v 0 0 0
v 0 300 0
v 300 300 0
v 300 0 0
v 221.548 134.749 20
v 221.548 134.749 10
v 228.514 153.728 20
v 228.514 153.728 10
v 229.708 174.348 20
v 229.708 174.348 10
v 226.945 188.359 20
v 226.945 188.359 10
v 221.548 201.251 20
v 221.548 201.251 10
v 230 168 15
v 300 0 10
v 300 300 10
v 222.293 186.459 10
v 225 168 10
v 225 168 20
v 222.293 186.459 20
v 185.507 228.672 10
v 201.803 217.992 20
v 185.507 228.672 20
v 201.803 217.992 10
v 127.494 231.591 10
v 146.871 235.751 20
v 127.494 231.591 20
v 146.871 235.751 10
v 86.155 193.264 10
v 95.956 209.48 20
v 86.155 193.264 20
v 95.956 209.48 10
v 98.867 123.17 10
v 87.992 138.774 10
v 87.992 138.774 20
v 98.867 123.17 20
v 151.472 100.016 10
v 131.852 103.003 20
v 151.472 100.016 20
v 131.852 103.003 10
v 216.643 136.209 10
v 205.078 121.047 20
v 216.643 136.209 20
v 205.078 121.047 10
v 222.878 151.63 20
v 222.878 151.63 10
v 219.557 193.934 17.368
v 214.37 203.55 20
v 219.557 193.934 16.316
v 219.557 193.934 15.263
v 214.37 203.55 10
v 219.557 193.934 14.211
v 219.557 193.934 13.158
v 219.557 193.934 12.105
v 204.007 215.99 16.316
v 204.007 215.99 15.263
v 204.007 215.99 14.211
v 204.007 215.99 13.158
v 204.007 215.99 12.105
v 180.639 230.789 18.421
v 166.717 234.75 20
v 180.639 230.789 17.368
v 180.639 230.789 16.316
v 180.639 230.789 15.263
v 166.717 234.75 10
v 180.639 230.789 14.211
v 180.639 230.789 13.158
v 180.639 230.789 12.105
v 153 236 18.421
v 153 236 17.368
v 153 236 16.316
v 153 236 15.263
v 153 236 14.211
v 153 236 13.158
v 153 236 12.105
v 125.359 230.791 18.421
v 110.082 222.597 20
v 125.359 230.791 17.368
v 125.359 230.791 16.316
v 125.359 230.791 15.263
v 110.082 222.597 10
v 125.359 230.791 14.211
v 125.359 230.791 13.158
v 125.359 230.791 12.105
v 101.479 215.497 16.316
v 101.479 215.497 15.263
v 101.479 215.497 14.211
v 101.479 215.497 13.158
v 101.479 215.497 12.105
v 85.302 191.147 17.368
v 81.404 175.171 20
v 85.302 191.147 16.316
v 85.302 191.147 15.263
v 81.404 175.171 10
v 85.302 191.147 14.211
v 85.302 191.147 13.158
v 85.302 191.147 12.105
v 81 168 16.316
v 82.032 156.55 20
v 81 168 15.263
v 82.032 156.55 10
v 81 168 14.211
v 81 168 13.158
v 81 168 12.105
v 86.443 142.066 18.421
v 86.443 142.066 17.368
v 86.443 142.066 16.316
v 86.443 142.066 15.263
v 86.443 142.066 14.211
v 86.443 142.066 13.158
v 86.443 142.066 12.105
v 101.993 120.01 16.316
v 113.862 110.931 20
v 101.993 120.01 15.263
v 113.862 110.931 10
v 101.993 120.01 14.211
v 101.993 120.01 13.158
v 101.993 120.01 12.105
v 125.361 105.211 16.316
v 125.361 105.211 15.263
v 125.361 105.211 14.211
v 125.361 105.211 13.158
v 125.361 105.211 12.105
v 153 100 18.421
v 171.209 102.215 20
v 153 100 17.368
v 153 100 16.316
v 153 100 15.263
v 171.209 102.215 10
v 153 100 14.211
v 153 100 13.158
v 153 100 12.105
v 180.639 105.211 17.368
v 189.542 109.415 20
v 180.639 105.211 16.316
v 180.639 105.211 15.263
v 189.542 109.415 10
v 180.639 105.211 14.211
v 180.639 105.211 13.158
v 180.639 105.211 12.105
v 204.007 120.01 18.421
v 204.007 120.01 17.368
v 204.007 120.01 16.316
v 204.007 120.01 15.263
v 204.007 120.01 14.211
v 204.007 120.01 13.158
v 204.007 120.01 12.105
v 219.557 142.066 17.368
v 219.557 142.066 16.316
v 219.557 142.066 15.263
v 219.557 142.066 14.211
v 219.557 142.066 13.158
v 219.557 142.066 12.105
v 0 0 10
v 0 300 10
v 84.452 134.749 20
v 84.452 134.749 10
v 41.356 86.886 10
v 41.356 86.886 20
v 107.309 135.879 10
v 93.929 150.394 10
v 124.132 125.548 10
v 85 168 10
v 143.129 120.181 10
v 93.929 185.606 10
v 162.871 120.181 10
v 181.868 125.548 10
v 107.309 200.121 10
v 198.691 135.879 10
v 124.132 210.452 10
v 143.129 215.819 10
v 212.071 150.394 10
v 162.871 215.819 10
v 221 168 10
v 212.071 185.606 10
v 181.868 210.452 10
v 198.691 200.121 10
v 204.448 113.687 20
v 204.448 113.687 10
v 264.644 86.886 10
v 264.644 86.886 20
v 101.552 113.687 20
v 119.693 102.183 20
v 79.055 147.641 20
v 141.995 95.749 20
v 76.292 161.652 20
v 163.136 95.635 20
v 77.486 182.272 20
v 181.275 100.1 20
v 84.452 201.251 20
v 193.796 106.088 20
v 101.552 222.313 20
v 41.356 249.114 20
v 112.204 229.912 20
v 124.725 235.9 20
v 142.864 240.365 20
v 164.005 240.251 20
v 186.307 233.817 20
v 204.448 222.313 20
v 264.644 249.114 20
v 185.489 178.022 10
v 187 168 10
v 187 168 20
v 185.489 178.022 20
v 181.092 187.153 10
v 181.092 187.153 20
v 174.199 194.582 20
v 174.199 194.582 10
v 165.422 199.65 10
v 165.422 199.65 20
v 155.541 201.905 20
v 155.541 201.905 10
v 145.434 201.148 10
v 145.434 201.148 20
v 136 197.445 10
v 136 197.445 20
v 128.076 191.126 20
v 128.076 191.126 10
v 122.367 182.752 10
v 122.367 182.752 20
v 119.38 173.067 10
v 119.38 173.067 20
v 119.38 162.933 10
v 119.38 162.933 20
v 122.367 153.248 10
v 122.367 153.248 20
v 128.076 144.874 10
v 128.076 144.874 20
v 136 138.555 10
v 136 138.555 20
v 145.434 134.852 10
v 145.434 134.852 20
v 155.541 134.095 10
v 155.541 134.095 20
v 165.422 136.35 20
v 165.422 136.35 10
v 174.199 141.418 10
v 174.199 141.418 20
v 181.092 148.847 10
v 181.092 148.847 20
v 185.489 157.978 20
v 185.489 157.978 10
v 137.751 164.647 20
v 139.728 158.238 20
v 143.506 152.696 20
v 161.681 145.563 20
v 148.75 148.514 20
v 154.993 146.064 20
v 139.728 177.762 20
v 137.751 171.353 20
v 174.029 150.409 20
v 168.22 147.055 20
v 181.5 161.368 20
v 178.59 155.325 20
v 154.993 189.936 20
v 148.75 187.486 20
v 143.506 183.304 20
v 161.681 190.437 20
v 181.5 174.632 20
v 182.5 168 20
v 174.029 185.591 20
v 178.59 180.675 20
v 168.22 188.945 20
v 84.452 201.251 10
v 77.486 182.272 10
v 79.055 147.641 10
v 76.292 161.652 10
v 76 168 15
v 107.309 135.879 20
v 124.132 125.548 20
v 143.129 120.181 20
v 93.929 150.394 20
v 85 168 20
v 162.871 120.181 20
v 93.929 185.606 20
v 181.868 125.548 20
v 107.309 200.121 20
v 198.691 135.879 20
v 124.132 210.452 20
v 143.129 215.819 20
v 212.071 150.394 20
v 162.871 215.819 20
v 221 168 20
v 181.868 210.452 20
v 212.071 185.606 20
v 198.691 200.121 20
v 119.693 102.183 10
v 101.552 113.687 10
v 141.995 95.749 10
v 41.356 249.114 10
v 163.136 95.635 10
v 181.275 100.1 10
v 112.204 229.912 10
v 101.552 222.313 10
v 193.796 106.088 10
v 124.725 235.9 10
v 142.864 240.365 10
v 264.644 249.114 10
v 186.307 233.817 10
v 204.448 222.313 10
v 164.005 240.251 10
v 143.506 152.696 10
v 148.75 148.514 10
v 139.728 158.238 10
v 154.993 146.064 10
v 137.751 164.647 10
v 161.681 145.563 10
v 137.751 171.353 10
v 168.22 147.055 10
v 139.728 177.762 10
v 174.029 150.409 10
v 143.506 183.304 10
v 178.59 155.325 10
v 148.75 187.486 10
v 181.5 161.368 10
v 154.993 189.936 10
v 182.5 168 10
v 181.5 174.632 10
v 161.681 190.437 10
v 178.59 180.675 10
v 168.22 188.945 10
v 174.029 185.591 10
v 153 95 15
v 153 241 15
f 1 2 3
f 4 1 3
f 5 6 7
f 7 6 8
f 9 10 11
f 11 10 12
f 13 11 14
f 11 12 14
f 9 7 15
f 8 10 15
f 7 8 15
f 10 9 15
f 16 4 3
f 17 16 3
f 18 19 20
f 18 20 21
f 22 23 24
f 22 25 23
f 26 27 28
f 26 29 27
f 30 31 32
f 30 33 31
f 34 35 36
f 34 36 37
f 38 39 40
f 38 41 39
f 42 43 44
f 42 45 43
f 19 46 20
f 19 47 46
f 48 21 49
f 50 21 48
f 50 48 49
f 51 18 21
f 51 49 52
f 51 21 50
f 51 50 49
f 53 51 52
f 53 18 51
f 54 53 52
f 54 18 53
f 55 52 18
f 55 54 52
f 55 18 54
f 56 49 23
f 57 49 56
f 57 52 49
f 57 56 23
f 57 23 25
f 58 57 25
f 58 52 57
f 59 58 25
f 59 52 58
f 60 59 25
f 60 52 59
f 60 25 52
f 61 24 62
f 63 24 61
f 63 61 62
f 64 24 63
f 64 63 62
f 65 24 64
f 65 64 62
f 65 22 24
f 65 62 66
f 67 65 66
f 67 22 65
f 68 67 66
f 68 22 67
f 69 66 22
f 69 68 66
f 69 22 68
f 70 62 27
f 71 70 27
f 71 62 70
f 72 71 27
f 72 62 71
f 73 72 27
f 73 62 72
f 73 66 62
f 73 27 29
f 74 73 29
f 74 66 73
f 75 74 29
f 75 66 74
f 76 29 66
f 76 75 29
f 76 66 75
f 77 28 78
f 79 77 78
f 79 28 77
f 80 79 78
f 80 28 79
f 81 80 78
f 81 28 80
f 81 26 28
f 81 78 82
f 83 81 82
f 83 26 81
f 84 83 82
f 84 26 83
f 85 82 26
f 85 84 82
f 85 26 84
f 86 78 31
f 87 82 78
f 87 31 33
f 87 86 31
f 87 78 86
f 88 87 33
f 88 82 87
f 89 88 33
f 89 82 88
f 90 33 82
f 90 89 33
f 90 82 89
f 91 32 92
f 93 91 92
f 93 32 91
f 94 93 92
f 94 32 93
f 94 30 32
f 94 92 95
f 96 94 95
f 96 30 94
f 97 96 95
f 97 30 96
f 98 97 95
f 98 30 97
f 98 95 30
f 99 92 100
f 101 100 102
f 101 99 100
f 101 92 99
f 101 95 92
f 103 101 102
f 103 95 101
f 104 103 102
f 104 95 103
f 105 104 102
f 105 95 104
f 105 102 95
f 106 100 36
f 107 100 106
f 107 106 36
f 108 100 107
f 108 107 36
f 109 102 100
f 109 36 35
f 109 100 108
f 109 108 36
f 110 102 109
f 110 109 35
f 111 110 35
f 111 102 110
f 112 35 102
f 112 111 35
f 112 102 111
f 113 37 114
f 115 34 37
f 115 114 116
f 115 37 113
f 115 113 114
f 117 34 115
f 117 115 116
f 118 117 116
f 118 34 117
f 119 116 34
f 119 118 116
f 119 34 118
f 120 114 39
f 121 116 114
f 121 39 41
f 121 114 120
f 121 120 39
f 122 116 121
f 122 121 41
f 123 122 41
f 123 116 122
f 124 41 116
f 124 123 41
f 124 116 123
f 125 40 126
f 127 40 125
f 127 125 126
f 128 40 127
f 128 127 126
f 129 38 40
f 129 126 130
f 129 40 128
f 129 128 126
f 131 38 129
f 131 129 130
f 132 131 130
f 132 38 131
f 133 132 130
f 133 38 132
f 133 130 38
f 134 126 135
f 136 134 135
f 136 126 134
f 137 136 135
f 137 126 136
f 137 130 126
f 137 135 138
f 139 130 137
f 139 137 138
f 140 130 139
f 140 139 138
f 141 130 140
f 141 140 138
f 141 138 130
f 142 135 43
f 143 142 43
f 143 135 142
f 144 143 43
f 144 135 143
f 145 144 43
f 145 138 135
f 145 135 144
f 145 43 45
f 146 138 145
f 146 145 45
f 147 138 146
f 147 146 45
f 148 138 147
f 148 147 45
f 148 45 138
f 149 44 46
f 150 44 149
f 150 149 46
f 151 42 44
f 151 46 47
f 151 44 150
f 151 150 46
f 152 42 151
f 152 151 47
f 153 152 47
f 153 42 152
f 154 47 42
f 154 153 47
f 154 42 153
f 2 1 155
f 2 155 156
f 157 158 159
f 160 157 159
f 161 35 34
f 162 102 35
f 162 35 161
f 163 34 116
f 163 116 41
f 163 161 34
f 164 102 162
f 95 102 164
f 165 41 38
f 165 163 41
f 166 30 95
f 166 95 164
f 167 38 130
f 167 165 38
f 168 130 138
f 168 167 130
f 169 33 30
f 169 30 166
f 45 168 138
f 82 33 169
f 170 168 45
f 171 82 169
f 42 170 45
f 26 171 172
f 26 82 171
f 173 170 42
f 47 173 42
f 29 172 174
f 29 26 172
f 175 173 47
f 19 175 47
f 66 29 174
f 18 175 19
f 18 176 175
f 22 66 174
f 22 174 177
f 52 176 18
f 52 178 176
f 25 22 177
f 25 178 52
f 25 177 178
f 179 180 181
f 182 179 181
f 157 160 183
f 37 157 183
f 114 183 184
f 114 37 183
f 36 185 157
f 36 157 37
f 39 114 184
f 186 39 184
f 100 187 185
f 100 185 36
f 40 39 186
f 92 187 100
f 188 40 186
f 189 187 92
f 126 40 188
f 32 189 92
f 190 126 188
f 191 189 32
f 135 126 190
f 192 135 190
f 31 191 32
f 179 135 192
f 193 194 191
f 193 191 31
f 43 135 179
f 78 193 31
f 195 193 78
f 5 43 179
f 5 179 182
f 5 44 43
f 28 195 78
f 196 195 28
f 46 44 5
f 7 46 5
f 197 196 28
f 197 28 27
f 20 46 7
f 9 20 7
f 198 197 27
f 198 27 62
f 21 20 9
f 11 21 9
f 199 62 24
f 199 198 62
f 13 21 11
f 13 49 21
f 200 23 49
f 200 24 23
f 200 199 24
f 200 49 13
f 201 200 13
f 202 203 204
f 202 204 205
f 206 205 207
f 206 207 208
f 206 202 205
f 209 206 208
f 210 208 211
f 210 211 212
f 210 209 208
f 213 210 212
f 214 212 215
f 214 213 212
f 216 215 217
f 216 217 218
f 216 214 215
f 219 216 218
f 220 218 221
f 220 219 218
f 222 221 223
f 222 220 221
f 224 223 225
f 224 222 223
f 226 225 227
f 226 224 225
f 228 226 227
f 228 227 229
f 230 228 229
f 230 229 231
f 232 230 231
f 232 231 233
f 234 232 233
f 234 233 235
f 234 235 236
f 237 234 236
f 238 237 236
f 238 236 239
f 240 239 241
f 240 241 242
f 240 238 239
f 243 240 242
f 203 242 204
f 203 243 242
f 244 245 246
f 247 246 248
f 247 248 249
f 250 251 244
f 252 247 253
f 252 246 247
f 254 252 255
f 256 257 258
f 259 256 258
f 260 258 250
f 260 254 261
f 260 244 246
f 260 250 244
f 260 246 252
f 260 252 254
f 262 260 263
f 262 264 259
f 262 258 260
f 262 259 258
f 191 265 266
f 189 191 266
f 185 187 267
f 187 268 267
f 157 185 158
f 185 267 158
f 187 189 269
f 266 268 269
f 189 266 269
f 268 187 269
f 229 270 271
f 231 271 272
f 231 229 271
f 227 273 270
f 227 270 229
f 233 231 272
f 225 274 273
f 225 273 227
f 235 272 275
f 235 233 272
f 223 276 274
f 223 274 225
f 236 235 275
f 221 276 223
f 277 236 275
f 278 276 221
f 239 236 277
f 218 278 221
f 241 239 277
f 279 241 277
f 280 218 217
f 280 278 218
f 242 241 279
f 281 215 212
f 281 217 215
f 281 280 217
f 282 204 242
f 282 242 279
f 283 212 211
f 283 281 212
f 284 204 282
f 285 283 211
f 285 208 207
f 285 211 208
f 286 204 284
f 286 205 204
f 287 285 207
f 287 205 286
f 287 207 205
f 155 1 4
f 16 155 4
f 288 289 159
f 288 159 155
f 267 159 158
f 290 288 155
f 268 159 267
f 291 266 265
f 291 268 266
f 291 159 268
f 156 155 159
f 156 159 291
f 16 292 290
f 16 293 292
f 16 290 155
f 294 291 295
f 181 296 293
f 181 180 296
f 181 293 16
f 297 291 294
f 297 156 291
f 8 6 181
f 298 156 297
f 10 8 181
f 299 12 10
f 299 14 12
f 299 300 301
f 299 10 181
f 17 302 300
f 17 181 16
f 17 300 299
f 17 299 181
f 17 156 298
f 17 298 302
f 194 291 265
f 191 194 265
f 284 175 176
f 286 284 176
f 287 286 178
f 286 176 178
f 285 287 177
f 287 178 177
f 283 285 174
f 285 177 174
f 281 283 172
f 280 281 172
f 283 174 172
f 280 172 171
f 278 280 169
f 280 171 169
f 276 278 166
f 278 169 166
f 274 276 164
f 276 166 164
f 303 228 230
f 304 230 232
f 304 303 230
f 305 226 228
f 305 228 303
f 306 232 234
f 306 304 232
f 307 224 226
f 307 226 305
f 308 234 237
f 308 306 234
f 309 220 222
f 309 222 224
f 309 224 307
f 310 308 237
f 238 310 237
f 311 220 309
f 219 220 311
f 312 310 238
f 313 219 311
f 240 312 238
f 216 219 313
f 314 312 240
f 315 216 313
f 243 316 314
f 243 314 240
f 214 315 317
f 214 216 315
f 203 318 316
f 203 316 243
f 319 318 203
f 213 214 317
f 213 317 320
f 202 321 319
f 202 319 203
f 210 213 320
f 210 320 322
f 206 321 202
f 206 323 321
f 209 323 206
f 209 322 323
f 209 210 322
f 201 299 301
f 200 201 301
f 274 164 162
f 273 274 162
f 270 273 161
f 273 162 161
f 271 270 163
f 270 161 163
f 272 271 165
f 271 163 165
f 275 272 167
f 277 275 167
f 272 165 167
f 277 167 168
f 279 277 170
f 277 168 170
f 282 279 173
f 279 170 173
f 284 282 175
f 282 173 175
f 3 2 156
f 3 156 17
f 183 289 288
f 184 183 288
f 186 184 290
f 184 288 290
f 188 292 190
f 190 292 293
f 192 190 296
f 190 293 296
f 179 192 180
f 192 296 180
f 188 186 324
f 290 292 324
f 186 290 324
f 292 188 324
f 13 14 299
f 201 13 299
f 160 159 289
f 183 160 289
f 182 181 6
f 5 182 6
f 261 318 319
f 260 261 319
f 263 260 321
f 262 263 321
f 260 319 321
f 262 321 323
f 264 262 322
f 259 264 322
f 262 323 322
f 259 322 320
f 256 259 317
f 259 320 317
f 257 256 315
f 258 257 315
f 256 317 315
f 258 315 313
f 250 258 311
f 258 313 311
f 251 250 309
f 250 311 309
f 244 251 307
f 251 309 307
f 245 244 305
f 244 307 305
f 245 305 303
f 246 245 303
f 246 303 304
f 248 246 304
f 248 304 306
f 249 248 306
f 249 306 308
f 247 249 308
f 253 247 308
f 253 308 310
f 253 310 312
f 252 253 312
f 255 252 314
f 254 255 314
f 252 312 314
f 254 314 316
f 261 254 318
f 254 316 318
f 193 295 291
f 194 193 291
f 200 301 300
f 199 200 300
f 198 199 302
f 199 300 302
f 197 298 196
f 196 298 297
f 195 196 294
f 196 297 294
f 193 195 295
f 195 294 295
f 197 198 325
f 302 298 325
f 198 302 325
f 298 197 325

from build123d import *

# Parameters (mm, degrees)
SKICA1_W                      = 300
SKICA1_H                      = 300
P_IDAT_VYSUNUT_M1_DEPTH       = 10
P_IDAT_VYSUNUT_M2_OUTLINE_R   = 34
P_IDAT_VYSUNUT_M2_OUTLINE_R_2 = 22.5
P_IDAT_VYSUNUT_M2_DEPTH       = 10


# Read off the part's stored shape, not the designer's step: Přidat vysunutím2
with BuildPart() as part:
    # Skica1 → Přidat vysunutím1 (new body)
    with BuildSketch(Plane.XY):
        with Locations((150, 150)):
            Rectangle(SKICA1_W, SKICA1_H)
    extrude(amount=P_IDAT_VYSUNUT_M1_DEPTH)

    # Přidat vysunutím2 outline → Přidat vysunutím2 (add)
    # profile 1 of 3: a face of its own
    with BuildSketch(Plane.XY.offset(10)):
        with BuildLine():
            Line((264.644345224, 249.114364816), (204.448257064, 222.313339624))
            add(Edge.make_bspline(
                [(204.448257064, 222.313339624), (153, 266.115859509), (101.551742936, 222.313339624)],
                knots=[0.839064453, 0.839064453, 0.839064453, 2.302528201, 2.302528201, 2.302528201], degree=2, weights=[1, 0.744018351, 1]))
            Line((101.551742936, 222.313339624), (41.355654776, 249.114364816))
            Line((41.355654776, 249.114364816), (84.451742425, 201.251310533))
            add(Edge.make_bspline(
                [(84.451742425, 201.251310533), (66.506189511, 168), (84.451742425, 134.748689467)],
                knots=[2.668661787, 2.668661787, 2.668661787, 3.614523521, 3.614523521, 3.614523521], degree=2, weights=[1, 0.890237111, 1]))
            Line((84.451742425, 134.748689467), (41.355654776, 86.885635184))
            Line((41.355654776, 86.885635184), (101.551742936, 113.686660376))
            add(Edge.make_bspline(
                [(101.551742936, 113.686660376), (153, 69.884140491), (204.448257064, 113.686660376)],
                knots=[3.980657106, 3.980657106, 3.980657106, 5.444120855, 5.444120855, 5.444120855], degree=2, weights=[1, 0.744018351, 1]))
            Line((204.448257064, 113.686660376), (264.644345224, 86.885635184))
            Line((264.644345224, 86.885635184), (221.548257575, 134.748689467))
            add(Edge.make_bspline(
                [(221.548257575, 134.748689467), (239.493810489, 168), (221.548257575, 201.251310533)],
                knots=[5.81025444, 5.81025444, 5.81025444, 6.756116174, 6.756116174, 6.756116174], degree=2, weights=[1, 0.890237111, 1]))
            Line((221.548257575, 201.251310533), (264.644345224, 249.114364816))
        make_face()
        with BuildLine():
            add(Edge.make_bspline(
                [(225, 168), (225, 176.864581058), (221.284259047, 194.593743175), (205.346766645, 217.22941635), (181.371826698, 232.430212202), (153, 237.784893899), (129.11147608, 233.276356498), (112.212158133, 224.593414956), (102.642030231, 216.993953421), (95.923468043, 209.682344585), (90.126433793, 201.707291075), (83.28831958, 188.170345197), (79.350635096, 167.005143483), (84.715740953, 141.406256825), (100.653233355, 118.77058365), (124.628173302, 103.569787798), (153, 98.215106101), (181.371826698, 103.569787798), (205.346766645, 118.77058365), (221.284259047, 141.406256825), (225, 159.135418942), (225, 168)],
                knots=[0, 0, 0, 0, 0.392699082, 0.785398163, 1.178097245, 1.570796327, 1.963495408, 2.170032115, 2.366381656, 2.481498811, 2.596615966, 2.792965507, 3.141592654, 3.534291735, 3.926990817, 4.319689899, 4.71238898, 5.105088062, 5.497787144, 5.890486225, 6.283185307, 6.283185307, 6.283185307, 6.283185307], degree=3))
        make_face(mode=Mode.SUBTRACT)
    # profile 2 of 3: a face of its own
    with BuildSketch(Plane.XY.offset(10)):
        with BuildLine():
            ThreePointArc((221, 168), (153, 216.5), (85, 168))
            ThreePointArc((85, 168), (153, 119.5), (221, 168))
        make_face()
        with Locations((153, 168)):
            Circle(P_IDAT_VYSUNUT_M2_OUTLINE_R, mode=Mode.SUBTRACT)
    # profile 3 of 3: a face of its own
    with BuildSketch(Plane.XY.offset(10)):
        with Locations((160, 168)):
            Circle(P_IDAT_VYSUNUT_M2_OUTLINE_R_2)
    extrude(amount=P_IDAT_VYSUNUT_M2_DEPTH)


solid = part.part
